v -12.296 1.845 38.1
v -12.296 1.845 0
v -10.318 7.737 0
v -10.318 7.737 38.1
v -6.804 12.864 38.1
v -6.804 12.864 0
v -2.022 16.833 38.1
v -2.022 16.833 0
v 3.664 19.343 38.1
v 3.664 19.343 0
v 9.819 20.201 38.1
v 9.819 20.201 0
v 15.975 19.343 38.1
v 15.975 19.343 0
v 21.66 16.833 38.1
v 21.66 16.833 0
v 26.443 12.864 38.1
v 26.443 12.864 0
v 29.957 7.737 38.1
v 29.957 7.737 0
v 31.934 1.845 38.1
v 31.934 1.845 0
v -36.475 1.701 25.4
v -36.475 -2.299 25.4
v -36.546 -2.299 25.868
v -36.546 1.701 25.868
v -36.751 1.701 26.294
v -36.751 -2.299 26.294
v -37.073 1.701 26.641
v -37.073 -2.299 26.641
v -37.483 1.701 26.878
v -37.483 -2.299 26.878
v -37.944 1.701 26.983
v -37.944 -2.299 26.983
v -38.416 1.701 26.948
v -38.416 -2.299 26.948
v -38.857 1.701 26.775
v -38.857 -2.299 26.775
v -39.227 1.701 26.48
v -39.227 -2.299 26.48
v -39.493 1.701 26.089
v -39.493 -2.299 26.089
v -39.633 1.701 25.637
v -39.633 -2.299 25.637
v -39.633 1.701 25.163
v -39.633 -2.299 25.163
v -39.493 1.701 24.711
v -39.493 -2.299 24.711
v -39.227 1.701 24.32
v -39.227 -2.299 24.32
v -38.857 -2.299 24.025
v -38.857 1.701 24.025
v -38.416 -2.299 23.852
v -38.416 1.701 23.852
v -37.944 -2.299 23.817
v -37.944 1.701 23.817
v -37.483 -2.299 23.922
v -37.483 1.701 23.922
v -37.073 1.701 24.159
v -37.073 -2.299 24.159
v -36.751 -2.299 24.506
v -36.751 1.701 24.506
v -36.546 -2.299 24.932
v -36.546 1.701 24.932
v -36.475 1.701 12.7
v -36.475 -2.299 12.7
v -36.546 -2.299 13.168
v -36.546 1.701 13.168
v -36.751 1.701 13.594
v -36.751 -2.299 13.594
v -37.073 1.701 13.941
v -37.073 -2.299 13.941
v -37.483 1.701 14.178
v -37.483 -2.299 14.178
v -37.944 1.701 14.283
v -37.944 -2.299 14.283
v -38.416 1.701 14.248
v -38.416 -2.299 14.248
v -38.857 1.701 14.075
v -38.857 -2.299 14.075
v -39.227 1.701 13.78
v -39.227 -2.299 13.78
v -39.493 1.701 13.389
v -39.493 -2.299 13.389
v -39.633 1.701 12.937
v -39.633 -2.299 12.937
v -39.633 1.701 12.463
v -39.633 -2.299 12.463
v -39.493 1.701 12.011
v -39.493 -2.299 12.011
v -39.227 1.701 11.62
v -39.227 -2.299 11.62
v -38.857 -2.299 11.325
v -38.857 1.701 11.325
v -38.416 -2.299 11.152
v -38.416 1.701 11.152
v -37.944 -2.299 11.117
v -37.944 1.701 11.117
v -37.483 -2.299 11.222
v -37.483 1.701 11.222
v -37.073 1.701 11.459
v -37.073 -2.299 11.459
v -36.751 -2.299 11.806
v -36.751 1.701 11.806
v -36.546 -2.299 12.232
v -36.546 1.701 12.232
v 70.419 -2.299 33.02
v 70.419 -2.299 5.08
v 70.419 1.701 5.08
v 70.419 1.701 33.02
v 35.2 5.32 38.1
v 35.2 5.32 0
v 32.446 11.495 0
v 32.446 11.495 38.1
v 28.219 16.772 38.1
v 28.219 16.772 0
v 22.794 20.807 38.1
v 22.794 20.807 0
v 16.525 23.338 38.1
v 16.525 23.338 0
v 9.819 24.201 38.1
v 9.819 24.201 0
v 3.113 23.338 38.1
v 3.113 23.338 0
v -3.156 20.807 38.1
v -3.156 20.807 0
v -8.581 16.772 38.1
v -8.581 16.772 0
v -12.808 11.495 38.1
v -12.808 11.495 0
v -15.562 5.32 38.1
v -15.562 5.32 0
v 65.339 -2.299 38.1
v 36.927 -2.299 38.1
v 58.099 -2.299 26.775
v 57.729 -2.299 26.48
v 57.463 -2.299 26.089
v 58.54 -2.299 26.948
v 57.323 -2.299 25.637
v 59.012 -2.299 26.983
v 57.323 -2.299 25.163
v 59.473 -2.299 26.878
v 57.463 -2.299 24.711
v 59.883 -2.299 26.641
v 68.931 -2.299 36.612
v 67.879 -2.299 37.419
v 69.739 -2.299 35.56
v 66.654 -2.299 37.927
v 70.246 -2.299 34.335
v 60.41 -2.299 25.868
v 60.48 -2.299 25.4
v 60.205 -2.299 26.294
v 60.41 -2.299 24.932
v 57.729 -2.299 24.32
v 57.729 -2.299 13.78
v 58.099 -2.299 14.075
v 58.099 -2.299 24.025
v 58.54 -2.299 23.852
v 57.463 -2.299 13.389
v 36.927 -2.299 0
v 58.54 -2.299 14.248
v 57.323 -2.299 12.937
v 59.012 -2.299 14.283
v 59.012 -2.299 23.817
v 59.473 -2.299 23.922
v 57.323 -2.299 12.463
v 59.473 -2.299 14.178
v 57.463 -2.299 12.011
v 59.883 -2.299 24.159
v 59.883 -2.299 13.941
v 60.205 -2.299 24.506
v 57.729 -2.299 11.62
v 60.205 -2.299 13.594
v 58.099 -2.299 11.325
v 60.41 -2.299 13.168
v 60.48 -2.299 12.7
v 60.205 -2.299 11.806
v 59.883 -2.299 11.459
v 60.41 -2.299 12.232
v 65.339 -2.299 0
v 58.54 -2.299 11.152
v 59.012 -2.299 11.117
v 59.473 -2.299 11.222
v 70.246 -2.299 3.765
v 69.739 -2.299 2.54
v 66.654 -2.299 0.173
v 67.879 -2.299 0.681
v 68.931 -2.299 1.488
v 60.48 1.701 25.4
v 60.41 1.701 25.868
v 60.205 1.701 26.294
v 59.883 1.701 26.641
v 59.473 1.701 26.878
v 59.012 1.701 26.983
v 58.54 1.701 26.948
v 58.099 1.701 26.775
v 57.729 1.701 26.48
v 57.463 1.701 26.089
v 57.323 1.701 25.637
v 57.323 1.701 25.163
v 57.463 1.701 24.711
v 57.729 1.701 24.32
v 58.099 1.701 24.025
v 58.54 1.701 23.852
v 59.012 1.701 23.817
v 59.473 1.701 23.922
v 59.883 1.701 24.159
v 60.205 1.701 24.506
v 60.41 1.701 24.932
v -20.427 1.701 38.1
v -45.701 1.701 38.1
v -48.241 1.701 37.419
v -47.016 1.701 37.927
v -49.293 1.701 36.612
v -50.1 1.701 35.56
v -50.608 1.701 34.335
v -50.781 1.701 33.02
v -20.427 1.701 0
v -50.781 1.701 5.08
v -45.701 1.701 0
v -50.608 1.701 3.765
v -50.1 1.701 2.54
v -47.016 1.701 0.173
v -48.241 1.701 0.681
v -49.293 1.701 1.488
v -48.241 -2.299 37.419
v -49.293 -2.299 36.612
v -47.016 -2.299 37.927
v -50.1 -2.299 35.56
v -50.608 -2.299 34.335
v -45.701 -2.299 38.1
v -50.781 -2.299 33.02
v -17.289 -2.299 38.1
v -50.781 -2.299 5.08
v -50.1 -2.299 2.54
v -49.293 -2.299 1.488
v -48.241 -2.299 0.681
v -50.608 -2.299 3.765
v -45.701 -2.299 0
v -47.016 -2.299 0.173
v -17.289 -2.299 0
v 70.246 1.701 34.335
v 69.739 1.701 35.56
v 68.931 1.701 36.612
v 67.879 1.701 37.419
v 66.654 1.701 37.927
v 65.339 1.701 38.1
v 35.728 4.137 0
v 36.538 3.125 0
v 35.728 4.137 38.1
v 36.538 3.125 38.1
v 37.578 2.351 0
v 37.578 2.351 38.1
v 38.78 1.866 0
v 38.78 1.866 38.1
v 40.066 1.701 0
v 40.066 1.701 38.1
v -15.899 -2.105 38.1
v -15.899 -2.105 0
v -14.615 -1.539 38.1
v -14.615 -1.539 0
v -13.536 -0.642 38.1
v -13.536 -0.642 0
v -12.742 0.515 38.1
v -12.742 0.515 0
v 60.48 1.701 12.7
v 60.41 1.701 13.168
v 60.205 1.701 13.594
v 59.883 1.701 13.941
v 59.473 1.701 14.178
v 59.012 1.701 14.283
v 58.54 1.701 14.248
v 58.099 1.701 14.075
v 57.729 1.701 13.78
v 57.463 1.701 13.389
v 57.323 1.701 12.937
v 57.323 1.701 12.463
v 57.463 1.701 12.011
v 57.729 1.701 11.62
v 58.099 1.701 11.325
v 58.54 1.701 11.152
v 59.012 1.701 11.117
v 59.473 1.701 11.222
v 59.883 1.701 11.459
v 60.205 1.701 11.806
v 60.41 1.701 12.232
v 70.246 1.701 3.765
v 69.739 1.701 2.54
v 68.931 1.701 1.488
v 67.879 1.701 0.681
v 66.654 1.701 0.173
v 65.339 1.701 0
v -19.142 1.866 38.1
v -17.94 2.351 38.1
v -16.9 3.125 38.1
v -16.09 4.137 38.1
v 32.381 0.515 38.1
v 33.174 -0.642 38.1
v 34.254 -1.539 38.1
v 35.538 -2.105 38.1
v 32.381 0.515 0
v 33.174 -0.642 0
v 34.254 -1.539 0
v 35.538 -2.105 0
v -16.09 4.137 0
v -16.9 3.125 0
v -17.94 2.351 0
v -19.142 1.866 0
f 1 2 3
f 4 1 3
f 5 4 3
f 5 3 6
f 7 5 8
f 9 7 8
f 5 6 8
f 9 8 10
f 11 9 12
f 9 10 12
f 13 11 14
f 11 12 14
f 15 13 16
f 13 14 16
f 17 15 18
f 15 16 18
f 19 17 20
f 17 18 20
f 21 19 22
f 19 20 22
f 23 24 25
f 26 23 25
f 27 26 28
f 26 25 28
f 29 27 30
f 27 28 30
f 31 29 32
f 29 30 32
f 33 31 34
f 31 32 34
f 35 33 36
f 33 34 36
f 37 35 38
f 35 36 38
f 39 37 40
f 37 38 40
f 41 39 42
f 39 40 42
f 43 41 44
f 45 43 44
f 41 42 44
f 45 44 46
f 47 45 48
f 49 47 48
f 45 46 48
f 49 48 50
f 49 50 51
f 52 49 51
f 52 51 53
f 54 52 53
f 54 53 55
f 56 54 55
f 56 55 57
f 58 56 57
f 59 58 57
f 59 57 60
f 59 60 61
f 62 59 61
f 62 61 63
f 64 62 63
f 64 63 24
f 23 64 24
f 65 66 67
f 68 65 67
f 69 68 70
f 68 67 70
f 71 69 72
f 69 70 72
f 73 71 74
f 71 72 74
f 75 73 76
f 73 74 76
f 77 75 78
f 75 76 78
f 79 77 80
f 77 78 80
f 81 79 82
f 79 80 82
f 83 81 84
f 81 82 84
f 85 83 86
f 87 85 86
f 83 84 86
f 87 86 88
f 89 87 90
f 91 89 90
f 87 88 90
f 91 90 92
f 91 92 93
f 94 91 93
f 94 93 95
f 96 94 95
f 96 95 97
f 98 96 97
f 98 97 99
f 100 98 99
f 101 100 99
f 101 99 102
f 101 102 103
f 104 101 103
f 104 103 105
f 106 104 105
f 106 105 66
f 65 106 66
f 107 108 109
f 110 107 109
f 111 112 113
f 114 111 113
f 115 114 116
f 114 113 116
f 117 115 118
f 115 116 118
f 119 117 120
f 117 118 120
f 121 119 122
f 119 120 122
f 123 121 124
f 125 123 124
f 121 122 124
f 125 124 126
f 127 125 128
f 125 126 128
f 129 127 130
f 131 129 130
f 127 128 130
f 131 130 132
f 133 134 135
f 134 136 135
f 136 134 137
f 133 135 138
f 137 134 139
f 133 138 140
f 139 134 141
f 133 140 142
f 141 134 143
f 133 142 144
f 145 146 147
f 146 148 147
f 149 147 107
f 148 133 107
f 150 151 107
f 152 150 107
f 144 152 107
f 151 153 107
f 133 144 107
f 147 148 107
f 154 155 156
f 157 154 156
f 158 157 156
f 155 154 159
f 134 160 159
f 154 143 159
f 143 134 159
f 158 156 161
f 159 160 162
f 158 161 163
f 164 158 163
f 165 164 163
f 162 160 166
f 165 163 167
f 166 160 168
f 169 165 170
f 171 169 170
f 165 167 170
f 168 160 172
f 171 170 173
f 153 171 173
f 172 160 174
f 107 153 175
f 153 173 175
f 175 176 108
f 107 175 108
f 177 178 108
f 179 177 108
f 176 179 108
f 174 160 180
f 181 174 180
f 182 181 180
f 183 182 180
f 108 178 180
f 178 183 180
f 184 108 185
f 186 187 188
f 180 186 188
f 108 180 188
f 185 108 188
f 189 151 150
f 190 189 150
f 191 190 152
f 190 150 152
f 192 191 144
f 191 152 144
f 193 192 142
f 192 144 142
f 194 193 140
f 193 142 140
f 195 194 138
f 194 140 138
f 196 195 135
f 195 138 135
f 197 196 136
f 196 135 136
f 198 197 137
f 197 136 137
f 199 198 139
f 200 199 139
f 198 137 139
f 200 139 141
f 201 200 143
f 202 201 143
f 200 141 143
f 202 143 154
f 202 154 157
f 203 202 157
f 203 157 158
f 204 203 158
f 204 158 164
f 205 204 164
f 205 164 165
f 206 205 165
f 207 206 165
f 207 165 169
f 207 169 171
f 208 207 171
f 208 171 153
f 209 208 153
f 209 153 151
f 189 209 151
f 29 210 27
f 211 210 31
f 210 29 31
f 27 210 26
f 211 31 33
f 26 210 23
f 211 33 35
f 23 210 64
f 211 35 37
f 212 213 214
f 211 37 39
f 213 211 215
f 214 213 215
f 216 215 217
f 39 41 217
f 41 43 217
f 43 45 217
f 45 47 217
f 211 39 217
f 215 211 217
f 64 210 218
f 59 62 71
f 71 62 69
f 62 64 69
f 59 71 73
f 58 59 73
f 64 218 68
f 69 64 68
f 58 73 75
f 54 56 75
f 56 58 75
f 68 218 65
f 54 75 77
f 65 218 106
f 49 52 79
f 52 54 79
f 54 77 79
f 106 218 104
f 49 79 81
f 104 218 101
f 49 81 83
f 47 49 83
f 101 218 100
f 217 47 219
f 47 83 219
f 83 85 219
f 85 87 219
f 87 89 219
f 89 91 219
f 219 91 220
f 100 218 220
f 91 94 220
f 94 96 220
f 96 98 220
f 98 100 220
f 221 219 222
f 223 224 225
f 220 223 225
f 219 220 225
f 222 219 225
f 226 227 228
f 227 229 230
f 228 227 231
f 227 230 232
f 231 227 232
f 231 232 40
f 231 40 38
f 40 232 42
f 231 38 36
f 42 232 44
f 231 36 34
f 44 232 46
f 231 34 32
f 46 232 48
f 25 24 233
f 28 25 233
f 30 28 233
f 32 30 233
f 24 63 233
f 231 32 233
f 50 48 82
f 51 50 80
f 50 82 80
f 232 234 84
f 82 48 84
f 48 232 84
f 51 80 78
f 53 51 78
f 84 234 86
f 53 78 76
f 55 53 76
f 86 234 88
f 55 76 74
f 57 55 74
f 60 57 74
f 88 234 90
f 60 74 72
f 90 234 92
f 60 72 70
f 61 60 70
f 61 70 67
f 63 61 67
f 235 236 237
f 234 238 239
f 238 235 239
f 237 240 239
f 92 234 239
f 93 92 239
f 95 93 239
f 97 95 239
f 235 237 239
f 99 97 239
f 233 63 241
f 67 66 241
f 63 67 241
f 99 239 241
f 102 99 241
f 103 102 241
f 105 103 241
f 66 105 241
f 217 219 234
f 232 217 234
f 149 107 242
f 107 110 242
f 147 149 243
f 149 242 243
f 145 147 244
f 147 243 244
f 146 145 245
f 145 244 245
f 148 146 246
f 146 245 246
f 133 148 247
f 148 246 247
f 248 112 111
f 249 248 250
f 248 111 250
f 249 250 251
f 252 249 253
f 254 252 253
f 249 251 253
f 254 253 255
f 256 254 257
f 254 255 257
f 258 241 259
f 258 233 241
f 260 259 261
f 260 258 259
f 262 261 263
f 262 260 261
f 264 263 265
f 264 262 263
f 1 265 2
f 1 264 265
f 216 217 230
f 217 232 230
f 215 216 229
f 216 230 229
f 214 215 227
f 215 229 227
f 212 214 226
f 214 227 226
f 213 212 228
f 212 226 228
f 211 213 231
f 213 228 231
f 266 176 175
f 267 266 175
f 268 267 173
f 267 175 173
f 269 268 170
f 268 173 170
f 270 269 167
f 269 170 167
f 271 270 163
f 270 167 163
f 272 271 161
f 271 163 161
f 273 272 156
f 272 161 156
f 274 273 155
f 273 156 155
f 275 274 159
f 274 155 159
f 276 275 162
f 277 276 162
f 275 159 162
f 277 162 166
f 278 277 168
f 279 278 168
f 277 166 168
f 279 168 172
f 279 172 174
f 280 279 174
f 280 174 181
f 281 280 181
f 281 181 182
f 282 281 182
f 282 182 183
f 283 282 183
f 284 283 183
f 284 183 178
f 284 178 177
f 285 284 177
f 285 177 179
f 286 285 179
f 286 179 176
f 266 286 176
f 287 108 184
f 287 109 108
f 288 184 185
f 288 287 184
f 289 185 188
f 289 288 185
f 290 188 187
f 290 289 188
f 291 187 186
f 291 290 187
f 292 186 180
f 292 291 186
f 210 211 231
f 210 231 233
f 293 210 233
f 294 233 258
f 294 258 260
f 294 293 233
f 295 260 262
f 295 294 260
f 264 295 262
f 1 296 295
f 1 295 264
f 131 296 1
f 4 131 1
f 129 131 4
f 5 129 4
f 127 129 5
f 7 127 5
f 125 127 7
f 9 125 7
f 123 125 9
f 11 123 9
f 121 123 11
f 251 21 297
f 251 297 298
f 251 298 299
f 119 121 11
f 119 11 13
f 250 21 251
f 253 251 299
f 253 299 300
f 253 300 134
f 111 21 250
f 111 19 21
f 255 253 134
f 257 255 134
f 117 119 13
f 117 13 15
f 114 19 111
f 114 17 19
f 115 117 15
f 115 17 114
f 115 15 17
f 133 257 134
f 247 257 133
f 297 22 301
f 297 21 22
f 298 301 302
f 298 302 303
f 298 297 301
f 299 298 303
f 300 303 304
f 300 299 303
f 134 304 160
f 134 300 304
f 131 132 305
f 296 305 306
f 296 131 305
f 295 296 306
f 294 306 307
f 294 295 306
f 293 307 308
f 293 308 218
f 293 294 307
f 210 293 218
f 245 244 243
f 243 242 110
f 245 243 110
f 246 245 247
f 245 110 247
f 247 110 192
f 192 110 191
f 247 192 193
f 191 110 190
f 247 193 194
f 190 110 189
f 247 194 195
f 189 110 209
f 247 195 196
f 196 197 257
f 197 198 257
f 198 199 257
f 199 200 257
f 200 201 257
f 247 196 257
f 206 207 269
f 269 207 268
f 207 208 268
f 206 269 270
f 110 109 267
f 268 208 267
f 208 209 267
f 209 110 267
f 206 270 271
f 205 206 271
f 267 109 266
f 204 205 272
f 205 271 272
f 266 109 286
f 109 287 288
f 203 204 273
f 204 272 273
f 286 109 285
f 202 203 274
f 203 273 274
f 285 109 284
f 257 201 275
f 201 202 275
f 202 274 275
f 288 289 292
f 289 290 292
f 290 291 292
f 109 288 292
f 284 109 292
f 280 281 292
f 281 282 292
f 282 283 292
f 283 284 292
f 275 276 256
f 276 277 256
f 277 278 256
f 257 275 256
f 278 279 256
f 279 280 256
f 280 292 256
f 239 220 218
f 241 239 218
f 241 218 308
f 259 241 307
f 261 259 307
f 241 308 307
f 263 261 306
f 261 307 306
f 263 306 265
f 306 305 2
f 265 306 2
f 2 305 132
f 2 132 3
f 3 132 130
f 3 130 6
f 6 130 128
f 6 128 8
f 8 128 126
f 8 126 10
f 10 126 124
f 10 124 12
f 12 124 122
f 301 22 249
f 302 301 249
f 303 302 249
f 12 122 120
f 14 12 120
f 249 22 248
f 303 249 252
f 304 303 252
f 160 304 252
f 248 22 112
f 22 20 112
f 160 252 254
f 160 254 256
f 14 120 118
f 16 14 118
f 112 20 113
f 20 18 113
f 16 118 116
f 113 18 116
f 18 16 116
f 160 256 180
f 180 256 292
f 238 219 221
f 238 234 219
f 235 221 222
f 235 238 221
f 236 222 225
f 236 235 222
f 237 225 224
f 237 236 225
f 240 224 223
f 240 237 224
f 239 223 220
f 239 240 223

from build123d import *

# Parameters (mm, degrees)
F1_DEPTH = 38.1
F2_R     = 5.08
F4_D     = 3.175


with BuildPart() as f1:
    # F0 (on Top) → F1 (new body)
    with BuildSketch(Plane.XY):
        with BuildLine():
            Line((32.319215, -2.299103), (32.319215, 1.700897))
            Line((32.319215, 1.700897), (36.015589, 1.700897))
            ThreePointArc((36.015589, 1.700897), (9.819215, 24.200897), (-16.377159, 1.700897))
            Line((-16.377159, 1.700897), (-12.680785, 1.700897))
            Line((-12.680785, 1.700897), (-12.680785, -2.299103))
            ThreePointArc((-12.680785, -2.299103), (9.819215, 20.200897), (32.319215, -2.299103))
        make_face()
        with BuildLine():
            Line((36.015589, 1.700897), (32.319215, 1.700897))
            Line((32.319215, 1.700897), (32.319215, -2.299103))
            Line((32.319215, -2.299103), (36.319215, -2.299103))
            ThreePointArc((36.319215, -2.299103), (36.2432, -0.293349), (36.015589, 1.700897))
        make_face()
        with BuildLine():
            Line((70.419215, 1.700897), (36.015589, 1.700897))
            ThreePointArc((36.015589, 1.700897), (36.2432, -0.293349), (36.319215, -2.299103))
            Line((36.319215, -2.299103), (70.419215, -2.299103))
            Line((70.419215, -2.299103), (70.419215, 1.700897))
        make_face()
        with BuildLine():
            Line((-12.680785, 1.700897), (-16.377159, 1.700897))
            ThreePointArc((-16.377159, 1.700897), (-16.604769, -0.293349), (-16.680785, -2.299103))
            Line((-16.680785, -2.299103), (-12.680785, -2.299103))
            Line((-12.680785, -2.299103), (-12.680785, 1.700897))
        make_face()
        with BuildLine():
            ThreePointArc((-16.680785, -2.299103), (-16.604769, -0.293349), (-16.377159, 1.700897))
            Line((-16.377159, 1.700897), (-50.780785, 1.700897))
            Line((-50.780785, 1.700897), (-50.780785, -2.299103))
            Line((-50.780785, -2.299103), (-16.680785, -2.299103))
        make_face()
    extrude(amount=F1_DEPTH)

    # F2
    f2_edges = [f1.edges().sort_by_distance(p)[0] for p in [
        (70.419215, -0.299103, 38.1),
        (70.419215, -0.299103, 0),
        (32.319215, -2.299103, 19.05),
        (-12.680785, -2.299103, 19.05),
        (-50.780785, -0.299103, 38.1),
        (-50.780785, -0.299103, 0),
        (-16.377159, 1.700897, 19.05),
        (36.015589, 1.700897, 19.05),
    ]]
    fillet(f2_edges, radius=F2_R)

    # F4 (through all)
    with Locations(Plane(origin=(0, 1.700897, 0), x_dir=(-1, 0, 0), z_dir=(0, 1, 0))):
        with Locations((-58.892906, 25.4), (-58.892906, 12.7), (38.062844, 12.7), (38.062844, 25.4)):
            Hole(F4_D / 2)


solid = f1.part
